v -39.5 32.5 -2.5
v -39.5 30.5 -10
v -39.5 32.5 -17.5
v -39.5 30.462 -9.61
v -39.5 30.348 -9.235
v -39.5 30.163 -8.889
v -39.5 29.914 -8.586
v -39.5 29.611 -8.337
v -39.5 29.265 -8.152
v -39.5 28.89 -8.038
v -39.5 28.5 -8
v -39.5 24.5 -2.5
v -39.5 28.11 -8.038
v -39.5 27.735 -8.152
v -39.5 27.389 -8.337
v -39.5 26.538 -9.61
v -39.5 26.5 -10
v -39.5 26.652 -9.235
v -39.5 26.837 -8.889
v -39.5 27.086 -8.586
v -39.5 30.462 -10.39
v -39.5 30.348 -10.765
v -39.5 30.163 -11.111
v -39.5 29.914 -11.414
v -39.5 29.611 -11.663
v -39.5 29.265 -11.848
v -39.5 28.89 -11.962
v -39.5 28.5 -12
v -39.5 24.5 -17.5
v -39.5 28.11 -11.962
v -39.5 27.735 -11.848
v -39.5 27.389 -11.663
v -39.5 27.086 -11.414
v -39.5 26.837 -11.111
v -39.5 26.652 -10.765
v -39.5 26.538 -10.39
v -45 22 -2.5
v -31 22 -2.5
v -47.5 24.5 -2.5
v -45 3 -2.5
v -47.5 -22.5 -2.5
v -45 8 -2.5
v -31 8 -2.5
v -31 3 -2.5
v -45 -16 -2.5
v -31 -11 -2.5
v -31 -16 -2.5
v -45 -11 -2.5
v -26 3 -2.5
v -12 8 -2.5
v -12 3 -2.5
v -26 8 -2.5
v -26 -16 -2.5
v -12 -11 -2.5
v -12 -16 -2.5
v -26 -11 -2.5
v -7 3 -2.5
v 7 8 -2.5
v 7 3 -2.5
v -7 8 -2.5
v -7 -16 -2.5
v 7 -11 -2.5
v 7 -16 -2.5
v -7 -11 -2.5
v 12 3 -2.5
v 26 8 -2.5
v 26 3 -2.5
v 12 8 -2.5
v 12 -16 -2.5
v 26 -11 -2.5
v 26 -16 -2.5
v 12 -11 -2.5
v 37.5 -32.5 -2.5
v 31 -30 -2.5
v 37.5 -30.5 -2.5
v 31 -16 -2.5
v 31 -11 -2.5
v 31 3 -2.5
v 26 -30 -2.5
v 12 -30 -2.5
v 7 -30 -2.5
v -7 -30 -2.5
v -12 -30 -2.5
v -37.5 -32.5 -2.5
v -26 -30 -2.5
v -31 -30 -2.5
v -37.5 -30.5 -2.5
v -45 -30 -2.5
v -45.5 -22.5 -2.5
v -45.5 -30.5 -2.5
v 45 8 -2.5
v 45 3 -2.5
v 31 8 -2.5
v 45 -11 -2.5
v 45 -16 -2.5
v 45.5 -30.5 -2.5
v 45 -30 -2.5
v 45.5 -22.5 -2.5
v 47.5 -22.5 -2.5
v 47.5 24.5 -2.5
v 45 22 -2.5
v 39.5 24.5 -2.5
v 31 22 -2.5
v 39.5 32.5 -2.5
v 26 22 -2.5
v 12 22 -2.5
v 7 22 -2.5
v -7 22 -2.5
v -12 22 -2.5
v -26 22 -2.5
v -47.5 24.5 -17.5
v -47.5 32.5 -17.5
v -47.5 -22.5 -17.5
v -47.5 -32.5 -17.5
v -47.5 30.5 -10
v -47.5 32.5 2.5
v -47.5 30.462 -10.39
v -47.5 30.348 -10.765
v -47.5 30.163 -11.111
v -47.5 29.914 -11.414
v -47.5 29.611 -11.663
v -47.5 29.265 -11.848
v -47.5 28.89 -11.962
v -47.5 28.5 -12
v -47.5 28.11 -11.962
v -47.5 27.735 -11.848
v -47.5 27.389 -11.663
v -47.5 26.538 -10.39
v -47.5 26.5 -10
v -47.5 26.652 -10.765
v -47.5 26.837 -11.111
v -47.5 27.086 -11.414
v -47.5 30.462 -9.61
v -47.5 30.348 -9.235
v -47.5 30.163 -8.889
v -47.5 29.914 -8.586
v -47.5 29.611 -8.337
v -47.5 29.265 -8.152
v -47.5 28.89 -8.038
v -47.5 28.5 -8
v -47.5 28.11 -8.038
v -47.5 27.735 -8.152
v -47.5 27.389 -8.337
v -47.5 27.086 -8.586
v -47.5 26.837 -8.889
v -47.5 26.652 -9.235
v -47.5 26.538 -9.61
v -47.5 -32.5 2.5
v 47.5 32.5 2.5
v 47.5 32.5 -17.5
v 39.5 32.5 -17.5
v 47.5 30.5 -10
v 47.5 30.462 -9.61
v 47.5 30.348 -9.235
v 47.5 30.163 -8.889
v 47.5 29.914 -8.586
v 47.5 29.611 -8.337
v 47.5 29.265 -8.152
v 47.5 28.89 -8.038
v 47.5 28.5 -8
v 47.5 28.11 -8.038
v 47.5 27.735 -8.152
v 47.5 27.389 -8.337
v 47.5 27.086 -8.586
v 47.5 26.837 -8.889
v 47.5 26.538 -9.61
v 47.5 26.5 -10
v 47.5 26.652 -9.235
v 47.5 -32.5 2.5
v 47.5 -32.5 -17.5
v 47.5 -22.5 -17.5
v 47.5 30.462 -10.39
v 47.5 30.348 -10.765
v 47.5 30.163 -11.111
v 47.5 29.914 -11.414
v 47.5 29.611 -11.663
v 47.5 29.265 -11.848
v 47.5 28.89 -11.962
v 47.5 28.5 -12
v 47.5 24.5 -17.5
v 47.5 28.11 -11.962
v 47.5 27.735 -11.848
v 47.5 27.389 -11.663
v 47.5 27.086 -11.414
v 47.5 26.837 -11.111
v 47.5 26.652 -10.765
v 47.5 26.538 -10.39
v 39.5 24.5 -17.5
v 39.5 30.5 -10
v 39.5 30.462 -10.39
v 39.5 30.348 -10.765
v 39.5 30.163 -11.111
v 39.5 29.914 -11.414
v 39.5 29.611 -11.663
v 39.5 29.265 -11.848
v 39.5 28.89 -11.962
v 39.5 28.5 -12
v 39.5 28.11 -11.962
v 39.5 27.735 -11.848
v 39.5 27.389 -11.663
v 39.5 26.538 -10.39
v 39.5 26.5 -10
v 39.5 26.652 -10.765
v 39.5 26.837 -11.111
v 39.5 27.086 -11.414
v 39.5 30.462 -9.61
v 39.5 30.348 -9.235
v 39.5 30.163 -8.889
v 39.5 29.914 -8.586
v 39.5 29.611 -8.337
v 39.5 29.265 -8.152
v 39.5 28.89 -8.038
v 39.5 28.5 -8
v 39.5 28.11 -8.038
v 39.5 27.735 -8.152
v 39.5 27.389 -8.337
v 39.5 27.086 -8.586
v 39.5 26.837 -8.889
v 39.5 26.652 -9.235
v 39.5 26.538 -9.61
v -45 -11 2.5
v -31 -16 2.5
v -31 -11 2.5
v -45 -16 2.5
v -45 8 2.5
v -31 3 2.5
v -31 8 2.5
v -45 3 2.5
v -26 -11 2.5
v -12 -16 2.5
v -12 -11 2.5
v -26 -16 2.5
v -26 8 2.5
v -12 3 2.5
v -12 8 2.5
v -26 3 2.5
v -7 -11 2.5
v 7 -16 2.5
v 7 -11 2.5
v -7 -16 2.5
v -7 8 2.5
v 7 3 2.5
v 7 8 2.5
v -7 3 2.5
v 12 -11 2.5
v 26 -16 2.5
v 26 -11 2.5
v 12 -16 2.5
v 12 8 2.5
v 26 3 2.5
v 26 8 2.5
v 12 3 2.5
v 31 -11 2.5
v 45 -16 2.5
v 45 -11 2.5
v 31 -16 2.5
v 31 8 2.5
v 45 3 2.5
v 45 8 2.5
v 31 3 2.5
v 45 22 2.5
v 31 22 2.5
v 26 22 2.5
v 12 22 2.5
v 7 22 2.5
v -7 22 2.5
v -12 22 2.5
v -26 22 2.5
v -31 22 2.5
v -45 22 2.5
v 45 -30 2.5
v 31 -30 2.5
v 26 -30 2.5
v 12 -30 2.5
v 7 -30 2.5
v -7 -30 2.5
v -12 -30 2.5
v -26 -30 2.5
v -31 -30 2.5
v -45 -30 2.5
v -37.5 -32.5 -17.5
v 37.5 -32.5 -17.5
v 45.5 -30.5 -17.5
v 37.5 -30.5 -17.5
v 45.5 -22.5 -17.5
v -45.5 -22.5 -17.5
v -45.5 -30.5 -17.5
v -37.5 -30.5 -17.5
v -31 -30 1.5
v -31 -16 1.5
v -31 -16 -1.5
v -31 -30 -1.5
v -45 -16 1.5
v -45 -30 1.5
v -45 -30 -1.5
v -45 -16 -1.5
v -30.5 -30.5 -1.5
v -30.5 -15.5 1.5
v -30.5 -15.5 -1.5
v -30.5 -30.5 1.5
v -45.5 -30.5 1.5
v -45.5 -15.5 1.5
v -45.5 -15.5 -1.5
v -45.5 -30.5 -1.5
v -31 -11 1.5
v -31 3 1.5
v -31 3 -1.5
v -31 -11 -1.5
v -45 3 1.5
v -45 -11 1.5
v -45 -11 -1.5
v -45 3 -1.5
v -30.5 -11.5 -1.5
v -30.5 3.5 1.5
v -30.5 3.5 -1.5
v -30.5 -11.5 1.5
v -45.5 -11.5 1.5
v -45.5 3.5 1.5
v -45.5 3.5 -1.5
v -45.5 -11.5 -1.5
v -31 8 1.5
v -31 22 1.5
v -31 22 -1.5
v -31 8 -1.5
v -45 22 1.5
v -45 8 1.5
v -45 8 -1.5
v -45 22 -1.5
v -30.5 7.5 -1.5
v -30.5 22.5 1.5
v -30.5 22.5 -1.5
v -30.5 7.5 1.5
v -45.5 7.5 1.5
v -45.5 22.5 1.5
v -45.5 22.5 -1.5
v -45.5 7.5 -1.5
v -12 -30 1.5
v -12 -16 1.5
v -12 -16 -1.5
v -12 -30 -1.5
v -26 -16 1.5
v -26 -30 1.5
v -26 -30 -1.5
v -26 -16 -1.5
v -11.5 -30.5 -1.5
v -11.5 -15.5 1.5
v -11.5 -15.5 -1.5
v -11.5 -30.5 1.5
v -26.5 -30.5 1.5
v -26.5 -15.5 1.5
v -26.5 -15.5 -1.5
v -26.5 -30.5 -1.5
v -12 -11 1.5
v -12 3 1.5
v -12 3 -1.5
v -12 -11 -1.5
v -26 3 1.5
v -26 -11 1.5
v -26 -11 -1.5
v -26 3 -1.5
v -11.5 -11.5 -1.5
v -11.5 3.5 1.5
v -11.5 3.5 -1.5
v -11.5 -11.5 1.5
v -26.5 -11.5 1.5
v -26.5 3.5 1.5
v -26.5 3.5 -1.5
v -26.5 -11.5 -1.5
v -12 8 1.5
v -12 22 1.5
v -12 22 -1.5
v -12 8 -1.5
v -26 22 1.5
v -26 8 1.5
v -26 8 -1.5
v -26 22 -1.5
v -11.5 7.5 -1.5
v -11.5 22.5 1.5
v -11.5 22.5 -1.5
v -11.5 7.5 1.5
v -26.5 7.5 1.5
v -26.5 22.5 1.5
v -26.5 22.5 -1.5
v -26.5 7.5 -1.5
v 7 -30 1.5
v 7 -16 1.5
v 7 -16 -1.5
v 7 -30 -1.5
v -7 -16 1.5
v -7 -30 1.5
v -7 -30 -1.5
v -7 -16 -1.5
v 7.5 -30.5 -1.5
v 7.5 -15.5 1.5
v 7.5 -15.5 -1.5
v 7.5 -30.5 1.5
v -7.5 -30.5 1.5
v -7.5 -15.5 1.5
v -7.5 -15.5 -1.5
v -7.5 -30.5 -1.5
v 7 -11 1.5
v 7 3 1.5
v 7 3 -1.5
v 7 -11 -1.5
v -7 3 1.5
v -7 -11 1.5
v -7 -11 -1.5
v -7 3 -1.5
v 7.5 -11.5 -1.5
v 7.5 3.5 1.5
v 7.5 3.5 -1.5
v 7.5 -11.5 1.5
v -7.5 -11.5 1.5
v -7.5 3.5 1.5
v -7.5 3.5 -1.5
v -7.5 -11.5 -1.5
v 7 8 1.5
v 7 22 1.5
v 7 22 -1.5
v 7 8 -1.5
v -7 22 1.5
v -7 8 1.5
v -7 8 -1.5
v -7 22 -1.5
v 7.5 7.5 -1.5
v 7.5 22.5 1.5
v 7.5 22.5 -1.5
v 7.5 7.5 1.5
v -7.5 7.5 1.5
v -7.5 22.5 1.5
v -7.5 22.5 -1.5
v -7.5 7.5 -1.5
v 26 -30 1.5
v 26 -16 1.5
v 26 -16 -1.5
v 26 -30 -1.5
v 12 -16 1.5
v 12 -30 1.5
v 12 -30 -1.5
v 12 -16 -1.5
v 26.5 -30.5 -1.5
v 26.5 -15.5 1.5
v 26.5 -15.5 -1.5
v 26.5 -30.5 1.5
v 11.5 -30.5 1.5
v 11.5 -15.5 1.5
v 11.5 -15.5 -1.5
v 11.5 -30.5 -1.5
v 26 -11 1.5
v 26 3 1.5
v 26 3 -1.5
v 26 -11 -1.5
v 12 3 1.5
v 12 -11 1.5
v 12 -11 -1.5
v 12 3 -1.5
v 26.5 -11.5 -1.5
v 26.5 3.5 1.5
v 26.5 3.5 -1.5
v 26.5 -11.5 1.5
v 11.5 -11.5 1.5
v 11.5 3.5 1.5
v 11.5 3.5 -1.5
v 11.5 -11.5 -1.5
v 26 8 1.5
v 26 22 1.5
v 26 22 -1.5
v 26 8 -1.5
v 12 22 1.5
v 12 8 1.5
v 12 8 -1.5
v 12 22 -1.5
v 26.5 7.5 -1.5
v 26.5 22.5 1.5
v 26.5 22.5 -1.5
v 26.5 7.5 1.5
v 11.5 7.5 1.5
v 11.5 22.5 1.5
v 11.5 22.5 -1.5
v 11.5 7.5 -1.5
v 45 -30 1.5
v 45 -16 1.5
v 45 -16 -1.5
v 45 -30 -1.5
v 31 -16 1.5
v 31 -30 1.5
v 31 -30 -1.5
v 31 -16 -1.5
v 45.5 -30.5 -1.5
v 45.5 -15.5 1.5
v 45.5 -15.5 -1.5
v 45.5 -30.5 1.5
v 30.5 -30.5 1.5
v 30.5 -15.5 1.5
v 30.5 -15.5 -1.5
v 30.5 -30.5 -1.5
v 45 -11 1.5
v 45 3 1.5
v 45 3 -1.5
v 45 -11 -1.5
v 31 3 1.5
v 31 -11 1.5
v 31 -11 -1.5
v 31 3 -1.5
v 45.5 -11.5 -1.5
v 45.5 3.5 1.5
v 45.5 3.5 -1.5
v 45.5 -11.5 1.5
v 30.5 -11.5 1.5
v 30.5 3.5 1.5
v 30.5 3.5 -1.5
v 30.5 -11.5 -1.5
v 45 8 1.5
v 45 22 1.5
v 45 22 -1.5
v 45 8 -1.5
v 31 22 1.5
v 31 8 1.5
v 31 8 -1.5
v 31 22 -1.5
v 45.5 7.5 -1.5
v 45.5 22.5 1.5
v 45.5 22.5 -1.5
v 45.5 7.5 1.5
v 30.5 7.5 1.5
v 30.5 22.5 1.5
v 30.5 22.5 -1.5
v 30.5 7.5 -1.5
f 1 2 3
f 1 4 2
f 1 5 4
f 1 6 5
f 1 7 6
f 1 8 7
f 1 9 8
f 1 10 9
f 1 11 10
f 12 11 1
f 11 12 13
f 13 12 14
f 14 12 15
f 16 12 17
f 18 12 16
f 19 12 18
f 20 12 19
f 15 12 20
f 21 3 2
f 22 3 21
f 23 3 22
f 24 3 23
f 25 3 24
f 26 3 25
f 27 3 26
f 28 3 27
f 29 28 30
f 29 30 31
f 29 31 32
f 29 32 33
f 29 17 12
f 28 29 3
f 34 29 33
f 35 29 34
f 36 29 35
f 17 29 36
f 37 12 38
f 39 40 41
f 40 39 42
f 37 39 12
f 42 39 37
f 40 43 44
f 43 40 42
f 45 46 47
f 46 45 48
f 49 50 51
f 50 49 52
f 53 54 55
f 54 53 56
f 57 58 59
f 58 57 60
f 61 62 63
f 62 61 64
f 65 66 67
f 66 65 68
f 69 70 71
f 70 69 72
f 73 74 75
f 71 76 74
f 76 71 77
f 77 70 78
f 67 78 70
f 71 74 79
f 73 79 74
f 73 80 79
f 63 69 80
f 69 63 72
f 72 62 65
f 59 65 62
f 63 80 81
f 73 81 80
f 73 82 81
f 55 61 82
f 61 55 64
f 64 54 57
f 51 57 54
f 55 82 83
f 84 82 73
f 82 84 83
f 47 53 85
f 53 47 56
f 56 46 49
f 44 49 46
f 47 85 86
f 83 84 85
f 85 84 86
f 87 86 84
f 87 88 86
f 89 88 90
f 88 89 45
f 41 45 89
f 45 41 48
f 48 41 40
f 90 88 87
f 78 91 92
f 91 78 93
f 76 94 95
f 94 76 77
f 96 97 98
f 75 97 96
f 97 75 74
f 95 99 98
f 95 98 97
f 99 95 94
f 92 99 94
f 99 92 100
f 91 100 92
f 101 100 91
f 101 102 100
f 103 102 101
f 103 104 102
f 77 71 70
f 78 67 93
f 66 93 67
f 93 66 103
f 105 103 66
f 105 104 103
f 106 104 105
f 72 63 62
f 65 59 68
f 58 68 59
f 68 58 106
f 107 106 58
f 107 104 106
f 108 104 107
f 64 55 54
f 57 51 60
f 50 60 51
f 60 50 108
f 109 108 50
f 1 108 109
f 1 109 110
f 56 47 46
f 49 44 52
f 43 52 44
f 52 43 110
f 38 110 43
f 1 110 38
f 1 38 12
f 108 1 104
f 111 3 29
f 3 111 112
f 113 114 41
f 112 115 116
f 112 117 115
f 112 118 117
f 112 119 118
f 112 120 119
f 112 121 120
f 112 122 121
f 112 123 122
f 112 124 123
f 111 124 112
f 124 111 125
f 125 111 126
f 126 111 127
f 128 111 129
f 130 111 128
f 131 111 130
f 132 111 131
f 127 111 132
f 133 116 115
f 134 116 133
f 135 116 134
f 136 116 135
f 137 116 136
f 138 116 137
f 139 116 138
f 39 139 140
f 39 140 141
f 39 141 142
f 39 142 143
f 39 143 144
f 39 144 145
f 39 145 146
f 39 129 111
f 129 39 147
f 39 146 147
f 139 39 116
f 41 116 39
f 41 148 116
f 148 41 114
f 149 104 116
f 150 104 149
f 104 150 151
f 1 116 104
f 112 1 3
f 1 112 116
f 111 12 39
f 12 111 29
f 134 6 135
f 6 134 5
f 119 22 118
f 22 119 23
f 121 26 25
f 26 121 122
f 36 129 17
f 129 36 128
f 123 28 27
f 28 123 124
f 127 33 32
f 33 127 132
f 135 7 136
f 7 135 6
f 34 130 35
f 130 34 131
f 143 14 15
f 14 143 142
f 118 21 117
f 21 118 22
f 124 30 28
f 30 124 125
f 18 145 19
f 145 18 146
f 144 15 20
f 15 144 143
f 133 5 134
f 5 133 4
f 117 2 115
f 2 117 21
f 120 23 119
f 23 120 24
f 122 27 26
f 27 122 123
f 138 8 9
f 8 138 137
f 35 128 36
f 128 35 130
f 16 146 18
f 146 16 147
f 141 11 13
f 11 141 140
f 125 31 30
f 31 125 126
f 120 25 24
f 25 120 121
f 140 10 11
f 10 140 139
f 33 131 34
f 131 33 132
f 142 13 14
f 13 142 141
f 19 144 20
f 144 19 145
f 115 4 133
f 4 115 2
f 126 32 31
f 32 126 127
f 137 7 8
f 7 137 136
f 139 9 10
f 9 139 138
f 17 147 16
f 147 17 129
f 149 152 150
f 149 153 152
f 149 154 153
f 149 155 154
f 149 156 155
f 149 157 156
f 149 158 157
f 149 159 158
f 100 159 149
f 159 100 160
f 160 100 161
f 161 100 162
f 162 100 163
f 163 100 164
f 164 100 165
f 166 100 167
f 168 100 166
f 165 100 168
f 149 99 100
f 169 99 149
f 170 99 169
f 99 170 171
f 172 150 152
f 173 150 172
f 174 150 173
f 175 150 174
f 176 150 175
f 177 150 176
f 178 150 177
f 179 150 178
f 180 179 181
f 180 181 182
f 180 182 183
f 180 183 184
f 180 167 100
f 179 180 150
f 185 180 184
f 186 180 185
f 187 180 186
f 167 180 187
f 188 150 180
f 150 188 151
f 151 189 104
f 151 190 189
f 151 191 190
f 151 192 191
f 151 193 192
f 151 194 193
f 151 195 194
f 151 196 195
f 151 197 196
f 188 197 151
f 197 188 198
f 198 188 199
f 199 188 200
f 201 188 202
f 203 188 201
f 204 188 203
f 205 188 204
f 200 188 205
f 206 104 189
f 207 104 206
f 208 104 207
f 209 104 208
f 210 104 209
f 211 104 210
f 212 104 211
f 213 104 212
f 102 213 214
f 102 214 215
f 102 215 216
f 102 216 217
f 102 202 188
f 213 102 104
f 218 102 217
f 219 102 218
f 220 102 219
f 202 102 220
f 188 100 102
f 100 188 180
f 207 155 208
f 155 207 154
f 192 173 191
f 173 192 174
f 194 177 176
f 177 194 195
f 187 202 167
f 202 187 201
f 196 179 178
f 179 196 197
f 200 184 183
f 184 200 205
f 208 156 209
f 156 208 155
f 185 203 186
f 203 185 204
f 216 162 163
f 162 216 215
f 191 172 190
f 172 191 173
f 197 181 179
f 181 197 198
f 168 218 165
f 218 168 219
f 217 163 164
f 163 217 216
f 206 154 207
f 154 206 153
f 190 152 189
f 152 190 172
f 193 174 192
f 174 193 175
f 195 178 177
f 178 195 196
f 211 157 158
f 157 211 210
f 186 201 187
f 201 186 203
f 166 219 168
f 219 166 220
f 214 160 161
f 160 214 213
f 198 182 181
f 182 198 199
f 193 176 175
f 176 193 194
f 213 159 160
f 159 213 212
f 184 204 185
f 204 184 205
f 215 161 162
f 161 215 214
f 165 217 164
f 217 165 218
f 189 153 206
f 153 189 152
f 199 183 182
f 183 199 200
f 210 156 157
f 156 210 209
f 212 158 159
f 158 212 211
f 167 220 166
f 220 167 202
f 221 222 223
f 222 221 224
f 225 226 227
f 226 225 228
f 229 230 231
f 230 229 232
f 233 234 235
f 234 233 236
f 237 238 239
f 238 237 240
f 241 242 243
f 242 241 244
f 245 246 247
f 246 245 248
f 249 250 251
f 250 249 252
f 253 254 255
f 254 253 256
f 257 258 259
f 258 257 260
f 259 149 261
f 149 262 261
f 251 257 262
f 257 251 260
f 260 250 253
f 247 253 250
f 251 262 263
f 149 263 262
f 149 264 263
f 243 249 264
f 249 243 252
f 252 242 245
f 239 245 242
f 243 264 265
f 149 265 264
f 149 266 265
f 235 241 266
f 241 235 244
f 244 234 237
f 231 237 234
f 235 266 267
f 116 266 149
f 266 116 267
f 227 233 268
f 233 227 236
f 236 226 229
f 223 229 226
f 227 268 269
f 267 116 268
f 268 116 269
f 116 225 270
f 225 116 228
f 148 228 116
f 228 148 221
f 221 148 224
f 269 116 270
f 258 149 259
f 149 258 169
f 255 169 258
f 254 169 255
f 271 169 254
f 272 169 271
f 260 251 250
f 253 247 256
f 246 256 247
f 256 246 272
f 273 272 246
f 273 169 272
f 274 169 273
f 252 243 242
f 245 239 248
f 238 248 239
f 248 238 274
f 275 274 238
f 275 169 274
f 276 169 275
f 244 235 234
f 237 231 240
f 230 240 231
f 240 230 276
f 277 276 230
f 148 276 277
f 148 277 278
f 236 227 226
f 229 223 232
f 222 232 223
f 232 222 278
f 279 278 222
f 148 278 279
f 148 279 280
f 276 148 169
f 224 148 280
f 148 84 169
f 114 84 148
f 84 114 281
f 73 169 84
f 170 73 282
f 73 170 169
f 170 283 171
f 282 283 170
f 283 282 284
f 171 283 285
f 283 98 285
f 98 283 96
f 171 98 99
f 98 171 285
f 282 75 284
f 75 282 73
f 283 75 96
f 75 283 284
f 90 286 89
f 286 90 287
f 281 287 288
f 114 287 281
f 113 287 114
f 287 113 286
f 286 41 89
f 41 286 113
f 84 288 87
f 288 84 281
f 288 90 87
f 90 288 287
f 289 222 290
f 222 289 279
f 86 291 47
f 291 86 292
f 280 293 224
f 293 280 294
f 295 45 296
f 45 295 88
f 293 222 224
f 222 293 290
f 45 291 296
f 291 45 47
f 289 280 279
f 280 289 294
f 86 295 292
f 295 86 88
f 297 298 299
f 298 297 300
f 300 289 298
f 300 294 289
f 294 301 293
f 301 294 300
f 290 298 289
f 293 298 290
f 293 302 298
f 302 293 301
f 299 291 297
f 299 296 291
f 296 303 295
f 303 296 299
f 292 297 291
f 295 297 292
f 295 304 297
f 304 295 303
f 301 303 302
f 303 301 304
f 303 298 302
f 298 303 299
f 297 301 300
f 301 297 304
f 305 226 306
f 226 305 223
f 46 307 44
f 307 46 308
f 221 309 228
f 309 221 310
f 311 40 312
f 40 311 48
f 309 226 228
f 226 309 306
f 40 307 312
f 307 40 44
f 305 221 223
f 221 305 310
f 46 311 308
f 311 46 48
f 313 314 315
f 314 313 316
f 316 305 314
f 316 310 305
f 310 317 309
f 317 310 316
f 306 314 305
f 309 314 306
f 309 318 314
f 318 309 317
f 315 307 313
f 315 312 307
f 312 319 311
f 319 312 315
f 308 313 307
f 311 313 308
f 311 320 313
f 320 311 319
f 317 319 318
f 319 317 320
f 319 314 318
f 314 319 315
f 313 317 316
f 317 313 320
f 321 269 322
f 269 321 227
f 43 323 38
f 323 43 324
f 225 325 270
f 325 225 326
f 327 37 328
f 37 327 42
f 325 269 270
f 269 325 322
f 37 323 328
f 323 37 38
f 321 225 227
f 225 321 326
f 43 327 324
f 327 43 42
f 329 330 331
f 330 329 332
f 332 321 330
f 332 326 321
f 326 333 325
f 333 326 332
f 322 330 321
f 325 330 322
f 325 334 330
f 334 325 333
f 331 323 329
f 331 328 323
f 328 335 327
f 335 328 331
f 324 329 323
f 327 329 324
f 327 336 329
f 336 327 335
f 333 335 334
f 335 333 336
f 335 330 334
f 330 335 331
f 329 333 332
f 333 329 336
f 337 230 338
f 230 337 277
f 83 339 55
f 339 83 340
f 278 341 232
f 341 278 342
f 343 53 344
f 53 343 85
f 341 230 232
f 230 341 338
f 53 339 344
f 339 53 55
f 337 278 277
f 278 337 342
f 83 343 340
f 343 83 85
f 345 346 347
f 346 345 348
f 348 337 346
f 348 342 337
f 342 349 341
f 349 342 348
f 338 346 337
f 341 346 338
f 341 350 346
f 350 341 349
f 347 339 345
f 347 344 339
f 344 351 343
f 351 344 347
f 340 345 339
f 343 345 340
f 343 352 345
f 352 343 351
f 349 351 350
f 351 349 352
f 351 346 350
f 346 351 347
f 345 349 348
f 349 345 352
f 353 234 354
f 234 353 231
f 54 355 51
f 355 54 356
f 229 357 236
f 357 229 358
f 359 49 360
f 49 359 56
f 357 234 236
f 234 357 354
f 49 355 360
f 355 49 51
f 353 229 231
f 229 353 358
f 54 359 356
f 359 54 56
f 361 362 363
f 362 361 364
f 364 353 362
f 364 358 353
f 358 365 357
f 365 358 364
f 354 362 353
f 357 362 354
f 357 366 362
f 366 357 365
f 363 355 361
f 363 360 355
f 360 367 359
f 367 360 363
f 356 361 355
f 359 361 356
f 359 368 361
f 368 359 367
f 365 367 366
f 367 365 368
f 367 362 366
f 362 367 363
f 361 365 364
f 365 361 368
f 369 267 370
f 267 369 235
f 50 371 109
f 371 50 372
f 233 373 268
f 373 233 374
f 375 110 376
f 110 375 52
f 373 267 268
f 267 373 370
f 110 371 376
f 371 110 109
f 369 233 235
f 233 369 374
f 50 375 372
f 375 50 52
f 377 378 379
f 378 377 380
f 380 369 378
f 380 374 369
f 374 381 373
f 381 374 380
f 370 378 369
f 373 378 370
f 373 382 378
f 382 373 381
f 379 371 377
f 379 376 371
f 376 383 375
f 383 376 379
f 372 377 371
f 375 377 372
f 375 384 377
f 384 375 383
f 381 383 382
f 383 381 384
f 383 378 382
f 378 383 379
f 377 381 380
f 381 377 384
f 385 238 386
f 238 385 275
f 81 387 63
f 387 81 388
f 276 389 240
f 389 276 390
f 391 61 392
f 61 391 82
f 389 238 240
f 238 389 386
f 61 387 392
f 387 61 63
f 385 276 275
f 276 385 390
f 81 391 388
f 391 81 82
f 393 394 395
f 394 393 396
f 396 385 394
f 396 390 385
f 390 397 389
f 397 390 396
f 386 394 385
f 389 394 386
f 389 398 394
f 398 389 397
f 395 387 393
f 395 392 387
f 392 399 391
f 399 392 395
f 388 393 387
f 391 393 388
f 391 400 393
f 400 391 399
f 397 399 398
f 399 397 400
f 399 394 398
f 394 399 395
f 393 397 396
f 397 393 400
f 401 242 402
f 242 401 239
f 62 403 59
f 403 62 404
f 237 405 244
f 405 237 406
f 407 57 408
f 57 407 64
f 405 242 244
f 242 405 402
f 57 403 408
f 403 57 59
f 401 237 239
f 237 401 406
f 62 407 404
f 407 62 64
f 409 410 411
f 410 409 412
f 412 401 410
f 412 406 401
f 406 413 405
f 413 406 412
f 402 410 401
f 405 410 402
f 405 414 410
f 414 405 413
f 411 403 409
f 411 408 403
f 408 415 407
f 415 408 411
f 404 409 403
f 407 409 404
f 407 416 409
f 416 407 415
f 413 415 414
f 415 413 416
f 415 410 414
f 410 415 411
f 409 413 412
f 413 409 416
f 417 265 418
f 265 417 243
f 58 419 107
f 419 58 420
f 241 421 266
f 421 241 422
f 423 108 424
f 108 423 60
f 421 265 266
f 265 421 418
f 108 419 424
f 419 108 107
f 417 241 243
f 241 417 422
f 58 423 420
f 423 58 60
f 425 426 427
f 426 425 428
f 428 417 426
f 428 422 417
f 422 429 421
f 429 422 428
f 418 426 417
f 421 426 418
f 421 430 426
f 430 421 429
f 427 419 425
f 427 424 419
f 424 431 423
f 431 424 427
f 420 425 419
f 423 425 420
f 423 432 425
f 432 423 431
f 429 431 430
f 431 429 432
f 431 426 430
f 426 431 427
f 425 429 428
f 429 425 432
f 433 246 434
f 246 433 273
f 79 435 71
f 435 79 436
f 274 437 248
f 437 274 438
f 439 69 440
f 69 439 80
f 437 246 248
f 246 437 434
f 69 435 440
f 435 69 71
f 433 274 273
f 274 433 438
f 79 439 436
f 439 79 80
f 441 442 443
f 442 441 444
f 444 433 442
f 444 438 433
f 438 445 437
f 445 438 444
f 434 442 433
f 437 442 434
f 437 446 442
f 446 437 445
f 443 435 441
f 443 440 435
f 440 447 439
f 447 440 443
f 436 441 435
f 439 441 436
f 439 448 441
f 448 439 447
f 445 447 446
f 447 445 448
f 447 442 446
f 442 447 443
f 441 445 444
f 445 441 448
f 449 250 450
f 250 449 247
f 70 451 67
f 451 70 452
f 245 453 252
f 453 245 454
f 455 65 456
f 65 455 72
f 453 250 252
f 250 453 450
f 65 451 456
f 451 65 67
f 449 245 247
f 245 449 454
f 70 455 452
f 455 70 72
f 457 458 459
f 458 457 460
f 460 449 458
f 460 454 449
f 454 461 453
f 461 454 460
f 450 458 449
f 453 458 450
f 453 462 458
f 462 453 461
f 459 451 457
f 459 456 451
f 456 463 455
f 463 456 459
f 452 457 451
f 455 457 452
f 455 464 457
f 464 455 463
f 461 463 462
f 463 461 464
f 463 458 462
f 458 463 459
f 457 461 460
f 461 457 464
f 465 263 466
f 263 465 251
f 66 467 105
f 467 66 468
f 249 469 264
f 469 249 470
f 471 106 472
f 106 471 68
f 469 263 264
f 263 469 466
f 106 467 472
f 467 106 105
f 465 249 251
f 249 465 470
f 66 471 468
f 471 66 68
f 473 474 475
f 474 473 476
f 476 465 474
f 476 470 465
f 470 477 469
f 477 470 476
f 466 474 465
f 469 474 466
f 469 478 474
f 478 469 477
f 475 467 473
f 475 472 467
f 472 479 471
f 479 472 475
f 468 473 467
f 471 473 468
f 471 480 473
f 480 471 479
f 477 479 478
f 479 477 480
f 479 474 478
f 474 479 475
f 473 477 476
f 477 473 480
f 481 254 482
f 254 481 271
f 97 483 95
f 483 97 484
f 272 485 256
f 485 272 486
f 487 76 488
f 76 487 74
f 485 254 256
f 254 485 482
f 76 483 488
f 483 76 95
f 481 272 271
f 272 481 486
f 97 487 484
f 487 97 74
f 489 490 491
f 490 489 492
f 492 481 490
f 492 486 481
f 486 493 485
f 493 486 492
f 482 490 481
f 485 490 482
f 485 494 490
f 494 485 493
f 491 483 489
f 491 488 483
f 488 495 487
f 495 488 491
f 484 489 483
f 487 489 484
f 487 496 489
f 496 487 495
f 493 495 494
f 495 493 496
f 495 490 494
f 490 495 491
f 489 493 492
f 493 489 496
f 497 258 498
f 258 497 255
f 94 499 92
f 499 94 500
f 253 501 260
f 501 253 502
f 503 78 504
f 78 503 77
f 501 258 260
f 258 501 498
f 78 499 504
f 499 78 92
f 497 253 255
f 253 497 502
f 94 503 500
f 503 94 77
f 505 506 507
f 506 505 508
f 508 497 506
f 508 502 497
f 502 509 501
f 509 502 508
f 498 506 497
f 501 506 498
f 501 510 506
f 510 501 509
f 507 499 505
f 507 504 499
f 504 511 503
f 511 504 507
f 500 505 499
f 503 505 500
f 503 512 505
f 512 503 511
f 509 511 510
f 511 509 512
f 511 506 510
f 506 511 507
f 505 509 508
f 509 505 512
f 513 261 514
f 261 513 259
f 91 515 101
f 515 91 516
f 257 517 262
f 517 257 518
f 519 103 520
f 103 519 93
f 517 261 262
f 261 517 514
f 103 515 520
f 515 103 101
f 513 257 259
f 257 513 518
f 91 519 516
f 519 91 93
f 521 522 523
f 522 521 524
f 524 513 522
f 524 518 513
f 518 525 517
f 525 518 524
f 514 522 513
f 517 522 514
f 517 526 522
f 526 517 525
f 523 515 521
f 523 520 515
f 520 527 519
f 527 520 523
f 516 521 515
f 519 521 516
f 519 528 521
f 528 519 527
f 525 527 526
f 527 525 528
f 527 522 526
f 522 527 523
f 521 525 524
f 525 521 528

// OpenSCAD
// file: common.scad
key_size = 14;

b_post = 8;
m_post_s = 2;
m_post_l = 10;
post_z = 15;

plat_z = 5;

module keyhole(x, y) {
  translate([x, y, 0]) {
    cube([key_size, key_size, plat_z + 1], center = true);
    cube([key_size + 1, key_size + 1, plat_z -2], center = true);
  }
}

module e_post(x, y, z) {
  translate([x, y, z]) {
    cube([b_post, b_post, post_z], center = true);
  }
}

module e_post_i(x, y, r) {
  translate([x, y, -(plat_z + post_z)/2]) {
    difference() {
      cube([b_post, b_post, post_z], center = true);
      rotate(r) cylinder(h=b_post+1, r=2, center=true, $fn=32);
    }
  }
}

module e_post_x(x, y) {
  e_post_i(x, y, [0, 90, 0]);
}


module e_post_y(x, y) {
  e_post_i(x, y, [90, 0, 0]);
}

module i_post_x(x, y) {
  translate([x, y, -(plat_z + post_z)/2]) cube([m_post_l, m_post_s, post_z], center = true);
}

module i_post_y(x, y) {
  translate([x, y, -(plat_z + post_z)/2]) cube([m_post_s, m_post_l, post_z], center = true);
}
// file: parameters.scad
key_size = 14;
key_sep = 5;
m_key_sep = 13.5;

border = 8;
b_post = 8;
m_post_s = 2;
m_post_l = 10;
post_z = 15;

key_cell = key_size + key_sep;
m_key_cell_x = key_size + m_key_sep;

plat_z = 5;
// main file
// Ortho Mega sections 2 and : Top mid sections.

include <parameters.scad>

plat_x = 5*key_cell;
plat_y = border + 3*key_cell;

use <common.scad>

difference() {
  union() {
    cube([plat_x, plat_y, 5], center = true);
    e_post_x(-(plat_x-b_post)/2, (plat_y-b_post)/2);
    
    e_post_x((plat_x-b_post)/2, (plat_y-b_post)/2);

    i_post_y((plat_x - m_post_s)/2, -(plat_y - m_post_l)/2);
    i_post_x((plat_x - m_post_l)/2, -(plat_y - m_post_s)/2);
    
    i_post_y(-(plat_x - m_post_s)/2, -(plat_y - m_post_l)/2);
    i_post_x(-(plat_x - m_post_l)/2, -(plat_y - m_post_s)/2);
  }

  for (x = [0:4]) {
    for (y = [0:2]) {
      keyhole(-plat_x/2 + key_cell/2 + x*key_cell, -plat_y/2 + key_cell/2 + y*key_cell);
    }
  }

  
  /* for (i = [0:3]) { */
  /*   keyhole(-plat_x/2 + border + key_cell/2 + i*key_cell, -plat_y/2 + key_cell/2); */
  /* }   */
  /* for (i = [0:2]) { */
  /*   keyhole(plat_x/2 - m_key_cell_x/2, -plat_y/2 + key_cell/2 + i*key_cell); */
  /* }  */
  /* keyhole(plat_x/2 - m_key_cell_x - m_key_cell_x/2, -plat_y/2 + key_cell + key_cell/2); */
  /* keyhole(plat_x/2 - 2*m_key_cell_x - m_key_cell_x/2, -plat_y/2 + key_cell + key_cell/2); */

}
